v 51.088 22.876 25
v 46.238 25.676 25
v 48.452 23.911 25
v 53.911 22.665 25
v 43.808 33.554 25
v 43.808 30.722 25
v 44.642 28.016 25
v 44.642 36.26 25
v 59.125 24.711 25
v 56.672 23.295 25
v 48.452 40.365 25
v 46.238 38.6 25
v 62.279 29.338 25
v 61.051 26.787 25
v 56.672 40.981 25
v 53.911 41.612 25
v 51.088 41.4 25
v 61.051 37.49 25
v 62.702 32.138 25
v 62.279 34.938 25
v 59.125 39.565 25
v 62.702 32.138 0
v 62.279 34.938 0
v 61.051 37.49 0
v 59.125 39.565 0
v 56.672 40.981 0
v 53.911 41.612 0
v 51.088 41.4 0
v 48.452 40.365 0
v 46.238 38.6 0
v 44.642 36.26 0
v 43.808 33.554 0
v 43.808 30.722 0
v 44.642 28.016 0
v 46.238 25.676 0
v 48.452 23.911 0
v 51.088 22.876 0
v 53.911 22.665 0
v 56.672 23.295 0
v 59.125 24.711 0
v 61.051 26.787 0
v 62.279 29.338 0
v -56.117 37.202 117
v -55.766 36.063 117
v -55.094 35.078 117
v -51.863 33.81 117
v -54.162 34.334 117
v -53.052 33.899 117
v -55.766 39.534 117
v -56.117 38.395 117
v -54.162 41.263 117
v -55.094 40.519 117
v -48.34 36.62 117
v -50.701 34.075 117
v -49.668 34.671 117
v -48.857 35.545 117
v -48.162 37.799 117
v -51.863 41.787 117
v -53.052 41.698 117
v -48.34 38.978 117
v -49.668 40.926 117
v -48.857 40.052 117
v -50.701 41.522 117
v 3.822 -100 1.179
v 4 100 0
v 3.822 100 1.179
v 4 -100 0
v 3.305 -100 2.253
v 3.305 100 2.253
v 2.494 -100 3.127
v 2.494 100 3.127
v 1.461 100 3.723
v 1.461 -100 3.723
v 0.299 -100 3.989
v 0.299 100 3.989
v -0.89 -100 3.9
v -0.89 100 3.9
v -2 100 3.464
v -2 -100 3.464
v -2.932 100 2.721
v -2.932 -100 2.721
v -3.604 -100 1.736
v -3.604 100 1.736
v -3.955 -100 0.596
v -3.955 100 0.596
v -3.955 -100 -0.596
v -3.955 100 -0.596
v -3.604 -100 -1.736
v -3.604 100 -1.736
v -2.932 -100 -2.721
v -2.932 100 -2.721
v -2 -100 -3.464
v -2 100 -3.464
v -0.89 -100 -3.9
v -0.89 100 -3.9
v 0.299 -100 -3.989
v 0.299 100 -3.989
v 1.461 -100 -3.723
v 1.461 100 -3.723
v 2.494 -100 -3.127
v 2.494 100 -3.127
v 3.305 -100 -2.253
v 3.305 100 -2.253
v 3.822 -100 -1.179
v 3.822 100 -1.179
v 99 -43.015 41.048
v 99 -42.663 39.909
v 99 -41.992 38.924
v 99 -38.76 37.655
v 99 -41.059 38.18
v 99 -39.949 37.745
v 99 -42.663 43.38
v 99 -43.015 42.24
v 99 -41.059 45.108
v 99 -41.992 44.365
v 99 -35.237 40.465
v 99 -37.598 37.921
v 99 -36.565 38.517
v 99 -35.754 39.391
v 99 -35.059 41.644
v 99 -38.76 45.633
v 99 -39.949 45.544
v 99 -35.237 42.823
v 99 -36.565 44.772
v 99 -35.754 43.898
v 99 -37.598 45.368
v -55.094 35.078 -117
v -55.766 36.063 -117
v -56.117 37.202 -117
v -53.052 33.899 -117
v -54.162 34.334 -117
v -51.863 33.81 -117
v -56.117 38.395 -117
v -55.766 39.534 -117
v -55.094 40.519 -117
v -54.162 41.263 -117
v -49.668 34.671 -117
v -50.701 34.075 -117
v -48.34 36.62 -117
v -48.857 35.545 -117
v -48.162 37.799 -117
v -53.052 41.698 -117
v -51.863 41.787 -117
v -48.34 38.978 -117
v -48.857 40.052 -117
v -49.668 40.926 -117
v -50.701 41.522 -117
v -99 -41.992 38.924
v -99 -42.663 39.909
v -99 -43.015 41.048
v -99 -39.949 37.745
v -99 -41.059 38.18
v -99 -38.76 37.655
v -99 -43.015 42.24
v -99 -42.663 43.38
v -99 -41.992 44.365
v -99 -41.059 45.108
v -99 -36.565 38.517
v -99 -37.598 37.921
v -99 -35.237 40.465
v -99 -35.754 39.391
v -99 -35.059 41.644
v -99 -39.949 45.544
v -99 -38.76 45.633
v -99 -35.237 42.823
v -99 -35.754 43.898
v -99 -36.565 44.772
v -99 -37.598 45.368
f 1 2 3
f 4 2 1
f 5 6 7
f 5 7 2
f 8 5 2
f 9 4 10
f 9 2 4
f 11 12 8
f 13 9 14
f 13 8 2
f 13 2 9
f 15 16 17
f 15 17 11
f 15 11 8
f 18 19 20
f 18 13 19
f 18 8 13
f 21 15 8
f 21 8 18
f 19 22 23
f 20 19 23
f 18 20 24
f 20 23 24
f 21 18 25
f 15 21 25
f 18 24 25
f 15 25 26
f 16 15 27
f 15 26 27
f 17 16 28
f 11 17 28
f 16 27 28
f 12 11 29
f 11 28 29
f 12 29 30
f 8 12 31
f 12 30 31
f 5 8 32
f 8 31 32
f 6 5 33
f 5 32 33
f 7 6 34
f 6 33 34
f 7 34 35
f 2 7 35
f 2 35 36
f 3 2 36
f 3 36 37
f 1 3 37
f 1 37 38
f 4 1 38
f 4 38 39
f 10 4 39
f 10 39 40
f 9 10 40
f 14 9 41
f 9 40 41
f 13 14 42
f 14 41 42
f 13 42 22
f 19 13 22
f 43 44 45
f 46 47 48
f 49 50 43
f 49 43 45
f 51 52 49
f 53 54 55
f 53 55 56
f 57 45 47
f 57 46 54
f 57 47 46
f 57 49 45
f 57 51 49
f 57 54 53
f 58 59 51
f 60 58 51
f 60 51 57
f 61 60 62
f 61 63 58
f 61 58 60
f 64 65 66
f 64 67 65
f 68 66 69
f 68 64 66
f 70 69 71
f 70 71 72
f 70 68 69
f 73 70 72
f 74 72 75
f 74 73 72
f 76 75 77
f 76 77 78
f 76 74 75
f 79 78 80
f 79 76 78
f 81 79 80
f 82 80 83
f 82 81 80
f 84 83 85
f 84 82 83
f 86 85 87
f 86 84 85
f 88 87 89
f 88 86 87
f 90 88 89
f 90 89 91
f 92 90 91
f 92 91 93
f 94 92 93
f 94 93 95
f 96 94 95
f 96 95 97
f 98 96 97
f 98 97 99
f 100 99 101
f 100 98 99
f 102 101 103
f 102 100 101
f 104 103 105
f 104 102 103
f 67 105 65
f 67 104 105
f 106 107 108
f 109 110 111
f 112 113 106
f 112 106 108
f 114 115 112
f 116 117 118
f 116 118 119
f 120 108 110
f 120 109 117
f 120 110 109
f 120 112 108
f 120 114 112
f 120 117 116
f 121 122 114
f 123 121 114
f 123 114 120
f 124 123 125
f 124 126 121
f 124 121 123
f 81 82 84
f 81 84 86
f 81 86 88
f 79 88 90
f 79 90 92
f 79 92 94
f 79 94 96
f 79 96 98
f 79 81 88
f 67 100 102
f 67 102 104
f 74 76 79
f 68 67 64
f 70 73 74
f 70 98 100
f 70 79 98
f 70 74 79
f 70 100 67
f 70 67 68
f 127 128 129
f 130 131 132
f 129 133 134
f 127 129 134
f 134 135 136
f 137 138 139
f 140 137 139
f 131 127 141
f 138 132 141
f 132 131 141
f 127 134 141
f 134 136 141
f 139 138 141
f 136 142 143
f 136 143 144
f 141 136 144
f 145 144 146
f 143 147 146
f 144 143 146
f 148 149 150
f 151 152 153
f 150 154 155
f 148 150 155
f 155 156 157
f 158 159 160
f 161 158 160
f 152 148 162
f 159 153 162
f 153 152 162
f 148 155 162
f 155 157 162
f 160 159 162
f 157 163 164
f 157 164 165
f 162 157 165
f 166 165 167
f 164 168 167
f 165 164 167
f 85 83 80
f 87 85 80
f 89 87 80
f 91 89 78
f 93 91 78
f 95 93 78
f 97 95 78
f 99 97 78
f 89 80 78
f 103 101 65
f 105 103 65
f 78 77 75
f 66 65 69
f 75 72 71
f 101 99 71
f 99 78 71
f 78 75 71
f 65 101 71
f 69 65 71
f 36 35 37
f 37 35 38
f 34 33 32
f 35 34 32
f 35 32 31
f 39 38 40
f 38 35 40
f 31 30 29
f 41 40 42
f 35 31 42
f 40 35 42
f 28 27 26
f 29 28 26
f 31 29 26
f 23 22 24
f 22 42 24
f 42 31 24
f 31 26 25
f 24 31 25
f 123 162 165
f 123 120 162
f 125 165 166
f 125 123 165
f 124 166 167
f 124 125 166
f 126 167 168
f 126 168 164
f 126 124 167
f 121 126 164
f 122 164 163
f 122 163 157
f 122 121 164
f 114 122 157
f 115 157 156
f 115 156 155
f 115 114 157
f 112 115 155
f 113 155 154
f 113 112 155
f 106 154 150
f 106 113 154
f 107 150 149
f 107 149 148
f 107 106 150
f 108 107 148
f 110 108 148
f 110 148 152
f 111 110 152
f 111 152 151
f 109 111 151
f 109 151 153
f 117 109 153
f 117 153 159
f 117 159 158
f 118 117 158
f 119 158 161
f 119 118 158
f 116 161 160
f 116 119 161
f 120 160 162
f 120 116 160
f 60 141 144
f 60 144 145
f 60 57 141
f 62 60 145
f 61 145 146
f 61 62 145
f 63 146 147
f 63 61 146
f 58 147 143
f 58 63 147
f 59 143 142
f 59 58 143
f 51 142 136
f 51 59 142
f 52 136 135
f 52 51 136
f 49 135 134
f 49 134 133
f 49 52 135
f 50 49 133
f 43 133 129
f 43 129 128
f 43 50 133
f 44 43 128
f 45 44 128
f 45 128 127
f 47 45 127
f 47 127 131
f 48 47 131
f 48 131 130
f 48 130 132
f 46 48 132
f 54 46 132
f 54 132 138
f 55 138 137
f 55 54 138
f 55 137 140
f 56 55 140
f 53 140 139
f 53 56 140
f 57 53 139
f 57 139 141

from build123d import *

# Parameters (mm, degrees)
F0_R     = 4
F1_DEPTH = 100
F2_R     = 4
F3_DEPTH = 117
F4_R     = 4
F5_DEPTH = 99
F6_R     = 9.5
F7_DEPTH = 25


with BuildPart() as f1:
    # F0 (on Front) → F1 (new body, symmetric)
    with BuildSketch(Plane.XZ):
        Circle(F0_R)
    extrude(amount=F1_DEPTH, both=True)


with BuildPart() as f3:
    # F2 (on Top) → F3 (new body, symmetric)
    with BuildSketch(Plane.XY):
        with Locations((-52.1620251238, 37.7985686064)):
            Circle(F2_R)
    extrude(amount=F3_DEPTH, both=True)


with BuildPart() as f5:
    # F4 (on Right) → F5 (new body, symmetric)
    with BuildSketch(Plane.YZ):
        with Locations((-39.0593670309, 41.6442379355)):
            Circle(F4_R)
    extrude(amount=F5_DEPTH, both=True)


with BuildPart() as f7:
    # F6 (on Top) → F7 (new body)
    with BuildSketch(Plane.XY):
        with Locations((53.201507777, 32.138068229)):
            Circle(F6_R)
    extrude(amount=F7_DEPTH)


solid = Compound([f1.part, f3.part, f5.part, f7.part])
